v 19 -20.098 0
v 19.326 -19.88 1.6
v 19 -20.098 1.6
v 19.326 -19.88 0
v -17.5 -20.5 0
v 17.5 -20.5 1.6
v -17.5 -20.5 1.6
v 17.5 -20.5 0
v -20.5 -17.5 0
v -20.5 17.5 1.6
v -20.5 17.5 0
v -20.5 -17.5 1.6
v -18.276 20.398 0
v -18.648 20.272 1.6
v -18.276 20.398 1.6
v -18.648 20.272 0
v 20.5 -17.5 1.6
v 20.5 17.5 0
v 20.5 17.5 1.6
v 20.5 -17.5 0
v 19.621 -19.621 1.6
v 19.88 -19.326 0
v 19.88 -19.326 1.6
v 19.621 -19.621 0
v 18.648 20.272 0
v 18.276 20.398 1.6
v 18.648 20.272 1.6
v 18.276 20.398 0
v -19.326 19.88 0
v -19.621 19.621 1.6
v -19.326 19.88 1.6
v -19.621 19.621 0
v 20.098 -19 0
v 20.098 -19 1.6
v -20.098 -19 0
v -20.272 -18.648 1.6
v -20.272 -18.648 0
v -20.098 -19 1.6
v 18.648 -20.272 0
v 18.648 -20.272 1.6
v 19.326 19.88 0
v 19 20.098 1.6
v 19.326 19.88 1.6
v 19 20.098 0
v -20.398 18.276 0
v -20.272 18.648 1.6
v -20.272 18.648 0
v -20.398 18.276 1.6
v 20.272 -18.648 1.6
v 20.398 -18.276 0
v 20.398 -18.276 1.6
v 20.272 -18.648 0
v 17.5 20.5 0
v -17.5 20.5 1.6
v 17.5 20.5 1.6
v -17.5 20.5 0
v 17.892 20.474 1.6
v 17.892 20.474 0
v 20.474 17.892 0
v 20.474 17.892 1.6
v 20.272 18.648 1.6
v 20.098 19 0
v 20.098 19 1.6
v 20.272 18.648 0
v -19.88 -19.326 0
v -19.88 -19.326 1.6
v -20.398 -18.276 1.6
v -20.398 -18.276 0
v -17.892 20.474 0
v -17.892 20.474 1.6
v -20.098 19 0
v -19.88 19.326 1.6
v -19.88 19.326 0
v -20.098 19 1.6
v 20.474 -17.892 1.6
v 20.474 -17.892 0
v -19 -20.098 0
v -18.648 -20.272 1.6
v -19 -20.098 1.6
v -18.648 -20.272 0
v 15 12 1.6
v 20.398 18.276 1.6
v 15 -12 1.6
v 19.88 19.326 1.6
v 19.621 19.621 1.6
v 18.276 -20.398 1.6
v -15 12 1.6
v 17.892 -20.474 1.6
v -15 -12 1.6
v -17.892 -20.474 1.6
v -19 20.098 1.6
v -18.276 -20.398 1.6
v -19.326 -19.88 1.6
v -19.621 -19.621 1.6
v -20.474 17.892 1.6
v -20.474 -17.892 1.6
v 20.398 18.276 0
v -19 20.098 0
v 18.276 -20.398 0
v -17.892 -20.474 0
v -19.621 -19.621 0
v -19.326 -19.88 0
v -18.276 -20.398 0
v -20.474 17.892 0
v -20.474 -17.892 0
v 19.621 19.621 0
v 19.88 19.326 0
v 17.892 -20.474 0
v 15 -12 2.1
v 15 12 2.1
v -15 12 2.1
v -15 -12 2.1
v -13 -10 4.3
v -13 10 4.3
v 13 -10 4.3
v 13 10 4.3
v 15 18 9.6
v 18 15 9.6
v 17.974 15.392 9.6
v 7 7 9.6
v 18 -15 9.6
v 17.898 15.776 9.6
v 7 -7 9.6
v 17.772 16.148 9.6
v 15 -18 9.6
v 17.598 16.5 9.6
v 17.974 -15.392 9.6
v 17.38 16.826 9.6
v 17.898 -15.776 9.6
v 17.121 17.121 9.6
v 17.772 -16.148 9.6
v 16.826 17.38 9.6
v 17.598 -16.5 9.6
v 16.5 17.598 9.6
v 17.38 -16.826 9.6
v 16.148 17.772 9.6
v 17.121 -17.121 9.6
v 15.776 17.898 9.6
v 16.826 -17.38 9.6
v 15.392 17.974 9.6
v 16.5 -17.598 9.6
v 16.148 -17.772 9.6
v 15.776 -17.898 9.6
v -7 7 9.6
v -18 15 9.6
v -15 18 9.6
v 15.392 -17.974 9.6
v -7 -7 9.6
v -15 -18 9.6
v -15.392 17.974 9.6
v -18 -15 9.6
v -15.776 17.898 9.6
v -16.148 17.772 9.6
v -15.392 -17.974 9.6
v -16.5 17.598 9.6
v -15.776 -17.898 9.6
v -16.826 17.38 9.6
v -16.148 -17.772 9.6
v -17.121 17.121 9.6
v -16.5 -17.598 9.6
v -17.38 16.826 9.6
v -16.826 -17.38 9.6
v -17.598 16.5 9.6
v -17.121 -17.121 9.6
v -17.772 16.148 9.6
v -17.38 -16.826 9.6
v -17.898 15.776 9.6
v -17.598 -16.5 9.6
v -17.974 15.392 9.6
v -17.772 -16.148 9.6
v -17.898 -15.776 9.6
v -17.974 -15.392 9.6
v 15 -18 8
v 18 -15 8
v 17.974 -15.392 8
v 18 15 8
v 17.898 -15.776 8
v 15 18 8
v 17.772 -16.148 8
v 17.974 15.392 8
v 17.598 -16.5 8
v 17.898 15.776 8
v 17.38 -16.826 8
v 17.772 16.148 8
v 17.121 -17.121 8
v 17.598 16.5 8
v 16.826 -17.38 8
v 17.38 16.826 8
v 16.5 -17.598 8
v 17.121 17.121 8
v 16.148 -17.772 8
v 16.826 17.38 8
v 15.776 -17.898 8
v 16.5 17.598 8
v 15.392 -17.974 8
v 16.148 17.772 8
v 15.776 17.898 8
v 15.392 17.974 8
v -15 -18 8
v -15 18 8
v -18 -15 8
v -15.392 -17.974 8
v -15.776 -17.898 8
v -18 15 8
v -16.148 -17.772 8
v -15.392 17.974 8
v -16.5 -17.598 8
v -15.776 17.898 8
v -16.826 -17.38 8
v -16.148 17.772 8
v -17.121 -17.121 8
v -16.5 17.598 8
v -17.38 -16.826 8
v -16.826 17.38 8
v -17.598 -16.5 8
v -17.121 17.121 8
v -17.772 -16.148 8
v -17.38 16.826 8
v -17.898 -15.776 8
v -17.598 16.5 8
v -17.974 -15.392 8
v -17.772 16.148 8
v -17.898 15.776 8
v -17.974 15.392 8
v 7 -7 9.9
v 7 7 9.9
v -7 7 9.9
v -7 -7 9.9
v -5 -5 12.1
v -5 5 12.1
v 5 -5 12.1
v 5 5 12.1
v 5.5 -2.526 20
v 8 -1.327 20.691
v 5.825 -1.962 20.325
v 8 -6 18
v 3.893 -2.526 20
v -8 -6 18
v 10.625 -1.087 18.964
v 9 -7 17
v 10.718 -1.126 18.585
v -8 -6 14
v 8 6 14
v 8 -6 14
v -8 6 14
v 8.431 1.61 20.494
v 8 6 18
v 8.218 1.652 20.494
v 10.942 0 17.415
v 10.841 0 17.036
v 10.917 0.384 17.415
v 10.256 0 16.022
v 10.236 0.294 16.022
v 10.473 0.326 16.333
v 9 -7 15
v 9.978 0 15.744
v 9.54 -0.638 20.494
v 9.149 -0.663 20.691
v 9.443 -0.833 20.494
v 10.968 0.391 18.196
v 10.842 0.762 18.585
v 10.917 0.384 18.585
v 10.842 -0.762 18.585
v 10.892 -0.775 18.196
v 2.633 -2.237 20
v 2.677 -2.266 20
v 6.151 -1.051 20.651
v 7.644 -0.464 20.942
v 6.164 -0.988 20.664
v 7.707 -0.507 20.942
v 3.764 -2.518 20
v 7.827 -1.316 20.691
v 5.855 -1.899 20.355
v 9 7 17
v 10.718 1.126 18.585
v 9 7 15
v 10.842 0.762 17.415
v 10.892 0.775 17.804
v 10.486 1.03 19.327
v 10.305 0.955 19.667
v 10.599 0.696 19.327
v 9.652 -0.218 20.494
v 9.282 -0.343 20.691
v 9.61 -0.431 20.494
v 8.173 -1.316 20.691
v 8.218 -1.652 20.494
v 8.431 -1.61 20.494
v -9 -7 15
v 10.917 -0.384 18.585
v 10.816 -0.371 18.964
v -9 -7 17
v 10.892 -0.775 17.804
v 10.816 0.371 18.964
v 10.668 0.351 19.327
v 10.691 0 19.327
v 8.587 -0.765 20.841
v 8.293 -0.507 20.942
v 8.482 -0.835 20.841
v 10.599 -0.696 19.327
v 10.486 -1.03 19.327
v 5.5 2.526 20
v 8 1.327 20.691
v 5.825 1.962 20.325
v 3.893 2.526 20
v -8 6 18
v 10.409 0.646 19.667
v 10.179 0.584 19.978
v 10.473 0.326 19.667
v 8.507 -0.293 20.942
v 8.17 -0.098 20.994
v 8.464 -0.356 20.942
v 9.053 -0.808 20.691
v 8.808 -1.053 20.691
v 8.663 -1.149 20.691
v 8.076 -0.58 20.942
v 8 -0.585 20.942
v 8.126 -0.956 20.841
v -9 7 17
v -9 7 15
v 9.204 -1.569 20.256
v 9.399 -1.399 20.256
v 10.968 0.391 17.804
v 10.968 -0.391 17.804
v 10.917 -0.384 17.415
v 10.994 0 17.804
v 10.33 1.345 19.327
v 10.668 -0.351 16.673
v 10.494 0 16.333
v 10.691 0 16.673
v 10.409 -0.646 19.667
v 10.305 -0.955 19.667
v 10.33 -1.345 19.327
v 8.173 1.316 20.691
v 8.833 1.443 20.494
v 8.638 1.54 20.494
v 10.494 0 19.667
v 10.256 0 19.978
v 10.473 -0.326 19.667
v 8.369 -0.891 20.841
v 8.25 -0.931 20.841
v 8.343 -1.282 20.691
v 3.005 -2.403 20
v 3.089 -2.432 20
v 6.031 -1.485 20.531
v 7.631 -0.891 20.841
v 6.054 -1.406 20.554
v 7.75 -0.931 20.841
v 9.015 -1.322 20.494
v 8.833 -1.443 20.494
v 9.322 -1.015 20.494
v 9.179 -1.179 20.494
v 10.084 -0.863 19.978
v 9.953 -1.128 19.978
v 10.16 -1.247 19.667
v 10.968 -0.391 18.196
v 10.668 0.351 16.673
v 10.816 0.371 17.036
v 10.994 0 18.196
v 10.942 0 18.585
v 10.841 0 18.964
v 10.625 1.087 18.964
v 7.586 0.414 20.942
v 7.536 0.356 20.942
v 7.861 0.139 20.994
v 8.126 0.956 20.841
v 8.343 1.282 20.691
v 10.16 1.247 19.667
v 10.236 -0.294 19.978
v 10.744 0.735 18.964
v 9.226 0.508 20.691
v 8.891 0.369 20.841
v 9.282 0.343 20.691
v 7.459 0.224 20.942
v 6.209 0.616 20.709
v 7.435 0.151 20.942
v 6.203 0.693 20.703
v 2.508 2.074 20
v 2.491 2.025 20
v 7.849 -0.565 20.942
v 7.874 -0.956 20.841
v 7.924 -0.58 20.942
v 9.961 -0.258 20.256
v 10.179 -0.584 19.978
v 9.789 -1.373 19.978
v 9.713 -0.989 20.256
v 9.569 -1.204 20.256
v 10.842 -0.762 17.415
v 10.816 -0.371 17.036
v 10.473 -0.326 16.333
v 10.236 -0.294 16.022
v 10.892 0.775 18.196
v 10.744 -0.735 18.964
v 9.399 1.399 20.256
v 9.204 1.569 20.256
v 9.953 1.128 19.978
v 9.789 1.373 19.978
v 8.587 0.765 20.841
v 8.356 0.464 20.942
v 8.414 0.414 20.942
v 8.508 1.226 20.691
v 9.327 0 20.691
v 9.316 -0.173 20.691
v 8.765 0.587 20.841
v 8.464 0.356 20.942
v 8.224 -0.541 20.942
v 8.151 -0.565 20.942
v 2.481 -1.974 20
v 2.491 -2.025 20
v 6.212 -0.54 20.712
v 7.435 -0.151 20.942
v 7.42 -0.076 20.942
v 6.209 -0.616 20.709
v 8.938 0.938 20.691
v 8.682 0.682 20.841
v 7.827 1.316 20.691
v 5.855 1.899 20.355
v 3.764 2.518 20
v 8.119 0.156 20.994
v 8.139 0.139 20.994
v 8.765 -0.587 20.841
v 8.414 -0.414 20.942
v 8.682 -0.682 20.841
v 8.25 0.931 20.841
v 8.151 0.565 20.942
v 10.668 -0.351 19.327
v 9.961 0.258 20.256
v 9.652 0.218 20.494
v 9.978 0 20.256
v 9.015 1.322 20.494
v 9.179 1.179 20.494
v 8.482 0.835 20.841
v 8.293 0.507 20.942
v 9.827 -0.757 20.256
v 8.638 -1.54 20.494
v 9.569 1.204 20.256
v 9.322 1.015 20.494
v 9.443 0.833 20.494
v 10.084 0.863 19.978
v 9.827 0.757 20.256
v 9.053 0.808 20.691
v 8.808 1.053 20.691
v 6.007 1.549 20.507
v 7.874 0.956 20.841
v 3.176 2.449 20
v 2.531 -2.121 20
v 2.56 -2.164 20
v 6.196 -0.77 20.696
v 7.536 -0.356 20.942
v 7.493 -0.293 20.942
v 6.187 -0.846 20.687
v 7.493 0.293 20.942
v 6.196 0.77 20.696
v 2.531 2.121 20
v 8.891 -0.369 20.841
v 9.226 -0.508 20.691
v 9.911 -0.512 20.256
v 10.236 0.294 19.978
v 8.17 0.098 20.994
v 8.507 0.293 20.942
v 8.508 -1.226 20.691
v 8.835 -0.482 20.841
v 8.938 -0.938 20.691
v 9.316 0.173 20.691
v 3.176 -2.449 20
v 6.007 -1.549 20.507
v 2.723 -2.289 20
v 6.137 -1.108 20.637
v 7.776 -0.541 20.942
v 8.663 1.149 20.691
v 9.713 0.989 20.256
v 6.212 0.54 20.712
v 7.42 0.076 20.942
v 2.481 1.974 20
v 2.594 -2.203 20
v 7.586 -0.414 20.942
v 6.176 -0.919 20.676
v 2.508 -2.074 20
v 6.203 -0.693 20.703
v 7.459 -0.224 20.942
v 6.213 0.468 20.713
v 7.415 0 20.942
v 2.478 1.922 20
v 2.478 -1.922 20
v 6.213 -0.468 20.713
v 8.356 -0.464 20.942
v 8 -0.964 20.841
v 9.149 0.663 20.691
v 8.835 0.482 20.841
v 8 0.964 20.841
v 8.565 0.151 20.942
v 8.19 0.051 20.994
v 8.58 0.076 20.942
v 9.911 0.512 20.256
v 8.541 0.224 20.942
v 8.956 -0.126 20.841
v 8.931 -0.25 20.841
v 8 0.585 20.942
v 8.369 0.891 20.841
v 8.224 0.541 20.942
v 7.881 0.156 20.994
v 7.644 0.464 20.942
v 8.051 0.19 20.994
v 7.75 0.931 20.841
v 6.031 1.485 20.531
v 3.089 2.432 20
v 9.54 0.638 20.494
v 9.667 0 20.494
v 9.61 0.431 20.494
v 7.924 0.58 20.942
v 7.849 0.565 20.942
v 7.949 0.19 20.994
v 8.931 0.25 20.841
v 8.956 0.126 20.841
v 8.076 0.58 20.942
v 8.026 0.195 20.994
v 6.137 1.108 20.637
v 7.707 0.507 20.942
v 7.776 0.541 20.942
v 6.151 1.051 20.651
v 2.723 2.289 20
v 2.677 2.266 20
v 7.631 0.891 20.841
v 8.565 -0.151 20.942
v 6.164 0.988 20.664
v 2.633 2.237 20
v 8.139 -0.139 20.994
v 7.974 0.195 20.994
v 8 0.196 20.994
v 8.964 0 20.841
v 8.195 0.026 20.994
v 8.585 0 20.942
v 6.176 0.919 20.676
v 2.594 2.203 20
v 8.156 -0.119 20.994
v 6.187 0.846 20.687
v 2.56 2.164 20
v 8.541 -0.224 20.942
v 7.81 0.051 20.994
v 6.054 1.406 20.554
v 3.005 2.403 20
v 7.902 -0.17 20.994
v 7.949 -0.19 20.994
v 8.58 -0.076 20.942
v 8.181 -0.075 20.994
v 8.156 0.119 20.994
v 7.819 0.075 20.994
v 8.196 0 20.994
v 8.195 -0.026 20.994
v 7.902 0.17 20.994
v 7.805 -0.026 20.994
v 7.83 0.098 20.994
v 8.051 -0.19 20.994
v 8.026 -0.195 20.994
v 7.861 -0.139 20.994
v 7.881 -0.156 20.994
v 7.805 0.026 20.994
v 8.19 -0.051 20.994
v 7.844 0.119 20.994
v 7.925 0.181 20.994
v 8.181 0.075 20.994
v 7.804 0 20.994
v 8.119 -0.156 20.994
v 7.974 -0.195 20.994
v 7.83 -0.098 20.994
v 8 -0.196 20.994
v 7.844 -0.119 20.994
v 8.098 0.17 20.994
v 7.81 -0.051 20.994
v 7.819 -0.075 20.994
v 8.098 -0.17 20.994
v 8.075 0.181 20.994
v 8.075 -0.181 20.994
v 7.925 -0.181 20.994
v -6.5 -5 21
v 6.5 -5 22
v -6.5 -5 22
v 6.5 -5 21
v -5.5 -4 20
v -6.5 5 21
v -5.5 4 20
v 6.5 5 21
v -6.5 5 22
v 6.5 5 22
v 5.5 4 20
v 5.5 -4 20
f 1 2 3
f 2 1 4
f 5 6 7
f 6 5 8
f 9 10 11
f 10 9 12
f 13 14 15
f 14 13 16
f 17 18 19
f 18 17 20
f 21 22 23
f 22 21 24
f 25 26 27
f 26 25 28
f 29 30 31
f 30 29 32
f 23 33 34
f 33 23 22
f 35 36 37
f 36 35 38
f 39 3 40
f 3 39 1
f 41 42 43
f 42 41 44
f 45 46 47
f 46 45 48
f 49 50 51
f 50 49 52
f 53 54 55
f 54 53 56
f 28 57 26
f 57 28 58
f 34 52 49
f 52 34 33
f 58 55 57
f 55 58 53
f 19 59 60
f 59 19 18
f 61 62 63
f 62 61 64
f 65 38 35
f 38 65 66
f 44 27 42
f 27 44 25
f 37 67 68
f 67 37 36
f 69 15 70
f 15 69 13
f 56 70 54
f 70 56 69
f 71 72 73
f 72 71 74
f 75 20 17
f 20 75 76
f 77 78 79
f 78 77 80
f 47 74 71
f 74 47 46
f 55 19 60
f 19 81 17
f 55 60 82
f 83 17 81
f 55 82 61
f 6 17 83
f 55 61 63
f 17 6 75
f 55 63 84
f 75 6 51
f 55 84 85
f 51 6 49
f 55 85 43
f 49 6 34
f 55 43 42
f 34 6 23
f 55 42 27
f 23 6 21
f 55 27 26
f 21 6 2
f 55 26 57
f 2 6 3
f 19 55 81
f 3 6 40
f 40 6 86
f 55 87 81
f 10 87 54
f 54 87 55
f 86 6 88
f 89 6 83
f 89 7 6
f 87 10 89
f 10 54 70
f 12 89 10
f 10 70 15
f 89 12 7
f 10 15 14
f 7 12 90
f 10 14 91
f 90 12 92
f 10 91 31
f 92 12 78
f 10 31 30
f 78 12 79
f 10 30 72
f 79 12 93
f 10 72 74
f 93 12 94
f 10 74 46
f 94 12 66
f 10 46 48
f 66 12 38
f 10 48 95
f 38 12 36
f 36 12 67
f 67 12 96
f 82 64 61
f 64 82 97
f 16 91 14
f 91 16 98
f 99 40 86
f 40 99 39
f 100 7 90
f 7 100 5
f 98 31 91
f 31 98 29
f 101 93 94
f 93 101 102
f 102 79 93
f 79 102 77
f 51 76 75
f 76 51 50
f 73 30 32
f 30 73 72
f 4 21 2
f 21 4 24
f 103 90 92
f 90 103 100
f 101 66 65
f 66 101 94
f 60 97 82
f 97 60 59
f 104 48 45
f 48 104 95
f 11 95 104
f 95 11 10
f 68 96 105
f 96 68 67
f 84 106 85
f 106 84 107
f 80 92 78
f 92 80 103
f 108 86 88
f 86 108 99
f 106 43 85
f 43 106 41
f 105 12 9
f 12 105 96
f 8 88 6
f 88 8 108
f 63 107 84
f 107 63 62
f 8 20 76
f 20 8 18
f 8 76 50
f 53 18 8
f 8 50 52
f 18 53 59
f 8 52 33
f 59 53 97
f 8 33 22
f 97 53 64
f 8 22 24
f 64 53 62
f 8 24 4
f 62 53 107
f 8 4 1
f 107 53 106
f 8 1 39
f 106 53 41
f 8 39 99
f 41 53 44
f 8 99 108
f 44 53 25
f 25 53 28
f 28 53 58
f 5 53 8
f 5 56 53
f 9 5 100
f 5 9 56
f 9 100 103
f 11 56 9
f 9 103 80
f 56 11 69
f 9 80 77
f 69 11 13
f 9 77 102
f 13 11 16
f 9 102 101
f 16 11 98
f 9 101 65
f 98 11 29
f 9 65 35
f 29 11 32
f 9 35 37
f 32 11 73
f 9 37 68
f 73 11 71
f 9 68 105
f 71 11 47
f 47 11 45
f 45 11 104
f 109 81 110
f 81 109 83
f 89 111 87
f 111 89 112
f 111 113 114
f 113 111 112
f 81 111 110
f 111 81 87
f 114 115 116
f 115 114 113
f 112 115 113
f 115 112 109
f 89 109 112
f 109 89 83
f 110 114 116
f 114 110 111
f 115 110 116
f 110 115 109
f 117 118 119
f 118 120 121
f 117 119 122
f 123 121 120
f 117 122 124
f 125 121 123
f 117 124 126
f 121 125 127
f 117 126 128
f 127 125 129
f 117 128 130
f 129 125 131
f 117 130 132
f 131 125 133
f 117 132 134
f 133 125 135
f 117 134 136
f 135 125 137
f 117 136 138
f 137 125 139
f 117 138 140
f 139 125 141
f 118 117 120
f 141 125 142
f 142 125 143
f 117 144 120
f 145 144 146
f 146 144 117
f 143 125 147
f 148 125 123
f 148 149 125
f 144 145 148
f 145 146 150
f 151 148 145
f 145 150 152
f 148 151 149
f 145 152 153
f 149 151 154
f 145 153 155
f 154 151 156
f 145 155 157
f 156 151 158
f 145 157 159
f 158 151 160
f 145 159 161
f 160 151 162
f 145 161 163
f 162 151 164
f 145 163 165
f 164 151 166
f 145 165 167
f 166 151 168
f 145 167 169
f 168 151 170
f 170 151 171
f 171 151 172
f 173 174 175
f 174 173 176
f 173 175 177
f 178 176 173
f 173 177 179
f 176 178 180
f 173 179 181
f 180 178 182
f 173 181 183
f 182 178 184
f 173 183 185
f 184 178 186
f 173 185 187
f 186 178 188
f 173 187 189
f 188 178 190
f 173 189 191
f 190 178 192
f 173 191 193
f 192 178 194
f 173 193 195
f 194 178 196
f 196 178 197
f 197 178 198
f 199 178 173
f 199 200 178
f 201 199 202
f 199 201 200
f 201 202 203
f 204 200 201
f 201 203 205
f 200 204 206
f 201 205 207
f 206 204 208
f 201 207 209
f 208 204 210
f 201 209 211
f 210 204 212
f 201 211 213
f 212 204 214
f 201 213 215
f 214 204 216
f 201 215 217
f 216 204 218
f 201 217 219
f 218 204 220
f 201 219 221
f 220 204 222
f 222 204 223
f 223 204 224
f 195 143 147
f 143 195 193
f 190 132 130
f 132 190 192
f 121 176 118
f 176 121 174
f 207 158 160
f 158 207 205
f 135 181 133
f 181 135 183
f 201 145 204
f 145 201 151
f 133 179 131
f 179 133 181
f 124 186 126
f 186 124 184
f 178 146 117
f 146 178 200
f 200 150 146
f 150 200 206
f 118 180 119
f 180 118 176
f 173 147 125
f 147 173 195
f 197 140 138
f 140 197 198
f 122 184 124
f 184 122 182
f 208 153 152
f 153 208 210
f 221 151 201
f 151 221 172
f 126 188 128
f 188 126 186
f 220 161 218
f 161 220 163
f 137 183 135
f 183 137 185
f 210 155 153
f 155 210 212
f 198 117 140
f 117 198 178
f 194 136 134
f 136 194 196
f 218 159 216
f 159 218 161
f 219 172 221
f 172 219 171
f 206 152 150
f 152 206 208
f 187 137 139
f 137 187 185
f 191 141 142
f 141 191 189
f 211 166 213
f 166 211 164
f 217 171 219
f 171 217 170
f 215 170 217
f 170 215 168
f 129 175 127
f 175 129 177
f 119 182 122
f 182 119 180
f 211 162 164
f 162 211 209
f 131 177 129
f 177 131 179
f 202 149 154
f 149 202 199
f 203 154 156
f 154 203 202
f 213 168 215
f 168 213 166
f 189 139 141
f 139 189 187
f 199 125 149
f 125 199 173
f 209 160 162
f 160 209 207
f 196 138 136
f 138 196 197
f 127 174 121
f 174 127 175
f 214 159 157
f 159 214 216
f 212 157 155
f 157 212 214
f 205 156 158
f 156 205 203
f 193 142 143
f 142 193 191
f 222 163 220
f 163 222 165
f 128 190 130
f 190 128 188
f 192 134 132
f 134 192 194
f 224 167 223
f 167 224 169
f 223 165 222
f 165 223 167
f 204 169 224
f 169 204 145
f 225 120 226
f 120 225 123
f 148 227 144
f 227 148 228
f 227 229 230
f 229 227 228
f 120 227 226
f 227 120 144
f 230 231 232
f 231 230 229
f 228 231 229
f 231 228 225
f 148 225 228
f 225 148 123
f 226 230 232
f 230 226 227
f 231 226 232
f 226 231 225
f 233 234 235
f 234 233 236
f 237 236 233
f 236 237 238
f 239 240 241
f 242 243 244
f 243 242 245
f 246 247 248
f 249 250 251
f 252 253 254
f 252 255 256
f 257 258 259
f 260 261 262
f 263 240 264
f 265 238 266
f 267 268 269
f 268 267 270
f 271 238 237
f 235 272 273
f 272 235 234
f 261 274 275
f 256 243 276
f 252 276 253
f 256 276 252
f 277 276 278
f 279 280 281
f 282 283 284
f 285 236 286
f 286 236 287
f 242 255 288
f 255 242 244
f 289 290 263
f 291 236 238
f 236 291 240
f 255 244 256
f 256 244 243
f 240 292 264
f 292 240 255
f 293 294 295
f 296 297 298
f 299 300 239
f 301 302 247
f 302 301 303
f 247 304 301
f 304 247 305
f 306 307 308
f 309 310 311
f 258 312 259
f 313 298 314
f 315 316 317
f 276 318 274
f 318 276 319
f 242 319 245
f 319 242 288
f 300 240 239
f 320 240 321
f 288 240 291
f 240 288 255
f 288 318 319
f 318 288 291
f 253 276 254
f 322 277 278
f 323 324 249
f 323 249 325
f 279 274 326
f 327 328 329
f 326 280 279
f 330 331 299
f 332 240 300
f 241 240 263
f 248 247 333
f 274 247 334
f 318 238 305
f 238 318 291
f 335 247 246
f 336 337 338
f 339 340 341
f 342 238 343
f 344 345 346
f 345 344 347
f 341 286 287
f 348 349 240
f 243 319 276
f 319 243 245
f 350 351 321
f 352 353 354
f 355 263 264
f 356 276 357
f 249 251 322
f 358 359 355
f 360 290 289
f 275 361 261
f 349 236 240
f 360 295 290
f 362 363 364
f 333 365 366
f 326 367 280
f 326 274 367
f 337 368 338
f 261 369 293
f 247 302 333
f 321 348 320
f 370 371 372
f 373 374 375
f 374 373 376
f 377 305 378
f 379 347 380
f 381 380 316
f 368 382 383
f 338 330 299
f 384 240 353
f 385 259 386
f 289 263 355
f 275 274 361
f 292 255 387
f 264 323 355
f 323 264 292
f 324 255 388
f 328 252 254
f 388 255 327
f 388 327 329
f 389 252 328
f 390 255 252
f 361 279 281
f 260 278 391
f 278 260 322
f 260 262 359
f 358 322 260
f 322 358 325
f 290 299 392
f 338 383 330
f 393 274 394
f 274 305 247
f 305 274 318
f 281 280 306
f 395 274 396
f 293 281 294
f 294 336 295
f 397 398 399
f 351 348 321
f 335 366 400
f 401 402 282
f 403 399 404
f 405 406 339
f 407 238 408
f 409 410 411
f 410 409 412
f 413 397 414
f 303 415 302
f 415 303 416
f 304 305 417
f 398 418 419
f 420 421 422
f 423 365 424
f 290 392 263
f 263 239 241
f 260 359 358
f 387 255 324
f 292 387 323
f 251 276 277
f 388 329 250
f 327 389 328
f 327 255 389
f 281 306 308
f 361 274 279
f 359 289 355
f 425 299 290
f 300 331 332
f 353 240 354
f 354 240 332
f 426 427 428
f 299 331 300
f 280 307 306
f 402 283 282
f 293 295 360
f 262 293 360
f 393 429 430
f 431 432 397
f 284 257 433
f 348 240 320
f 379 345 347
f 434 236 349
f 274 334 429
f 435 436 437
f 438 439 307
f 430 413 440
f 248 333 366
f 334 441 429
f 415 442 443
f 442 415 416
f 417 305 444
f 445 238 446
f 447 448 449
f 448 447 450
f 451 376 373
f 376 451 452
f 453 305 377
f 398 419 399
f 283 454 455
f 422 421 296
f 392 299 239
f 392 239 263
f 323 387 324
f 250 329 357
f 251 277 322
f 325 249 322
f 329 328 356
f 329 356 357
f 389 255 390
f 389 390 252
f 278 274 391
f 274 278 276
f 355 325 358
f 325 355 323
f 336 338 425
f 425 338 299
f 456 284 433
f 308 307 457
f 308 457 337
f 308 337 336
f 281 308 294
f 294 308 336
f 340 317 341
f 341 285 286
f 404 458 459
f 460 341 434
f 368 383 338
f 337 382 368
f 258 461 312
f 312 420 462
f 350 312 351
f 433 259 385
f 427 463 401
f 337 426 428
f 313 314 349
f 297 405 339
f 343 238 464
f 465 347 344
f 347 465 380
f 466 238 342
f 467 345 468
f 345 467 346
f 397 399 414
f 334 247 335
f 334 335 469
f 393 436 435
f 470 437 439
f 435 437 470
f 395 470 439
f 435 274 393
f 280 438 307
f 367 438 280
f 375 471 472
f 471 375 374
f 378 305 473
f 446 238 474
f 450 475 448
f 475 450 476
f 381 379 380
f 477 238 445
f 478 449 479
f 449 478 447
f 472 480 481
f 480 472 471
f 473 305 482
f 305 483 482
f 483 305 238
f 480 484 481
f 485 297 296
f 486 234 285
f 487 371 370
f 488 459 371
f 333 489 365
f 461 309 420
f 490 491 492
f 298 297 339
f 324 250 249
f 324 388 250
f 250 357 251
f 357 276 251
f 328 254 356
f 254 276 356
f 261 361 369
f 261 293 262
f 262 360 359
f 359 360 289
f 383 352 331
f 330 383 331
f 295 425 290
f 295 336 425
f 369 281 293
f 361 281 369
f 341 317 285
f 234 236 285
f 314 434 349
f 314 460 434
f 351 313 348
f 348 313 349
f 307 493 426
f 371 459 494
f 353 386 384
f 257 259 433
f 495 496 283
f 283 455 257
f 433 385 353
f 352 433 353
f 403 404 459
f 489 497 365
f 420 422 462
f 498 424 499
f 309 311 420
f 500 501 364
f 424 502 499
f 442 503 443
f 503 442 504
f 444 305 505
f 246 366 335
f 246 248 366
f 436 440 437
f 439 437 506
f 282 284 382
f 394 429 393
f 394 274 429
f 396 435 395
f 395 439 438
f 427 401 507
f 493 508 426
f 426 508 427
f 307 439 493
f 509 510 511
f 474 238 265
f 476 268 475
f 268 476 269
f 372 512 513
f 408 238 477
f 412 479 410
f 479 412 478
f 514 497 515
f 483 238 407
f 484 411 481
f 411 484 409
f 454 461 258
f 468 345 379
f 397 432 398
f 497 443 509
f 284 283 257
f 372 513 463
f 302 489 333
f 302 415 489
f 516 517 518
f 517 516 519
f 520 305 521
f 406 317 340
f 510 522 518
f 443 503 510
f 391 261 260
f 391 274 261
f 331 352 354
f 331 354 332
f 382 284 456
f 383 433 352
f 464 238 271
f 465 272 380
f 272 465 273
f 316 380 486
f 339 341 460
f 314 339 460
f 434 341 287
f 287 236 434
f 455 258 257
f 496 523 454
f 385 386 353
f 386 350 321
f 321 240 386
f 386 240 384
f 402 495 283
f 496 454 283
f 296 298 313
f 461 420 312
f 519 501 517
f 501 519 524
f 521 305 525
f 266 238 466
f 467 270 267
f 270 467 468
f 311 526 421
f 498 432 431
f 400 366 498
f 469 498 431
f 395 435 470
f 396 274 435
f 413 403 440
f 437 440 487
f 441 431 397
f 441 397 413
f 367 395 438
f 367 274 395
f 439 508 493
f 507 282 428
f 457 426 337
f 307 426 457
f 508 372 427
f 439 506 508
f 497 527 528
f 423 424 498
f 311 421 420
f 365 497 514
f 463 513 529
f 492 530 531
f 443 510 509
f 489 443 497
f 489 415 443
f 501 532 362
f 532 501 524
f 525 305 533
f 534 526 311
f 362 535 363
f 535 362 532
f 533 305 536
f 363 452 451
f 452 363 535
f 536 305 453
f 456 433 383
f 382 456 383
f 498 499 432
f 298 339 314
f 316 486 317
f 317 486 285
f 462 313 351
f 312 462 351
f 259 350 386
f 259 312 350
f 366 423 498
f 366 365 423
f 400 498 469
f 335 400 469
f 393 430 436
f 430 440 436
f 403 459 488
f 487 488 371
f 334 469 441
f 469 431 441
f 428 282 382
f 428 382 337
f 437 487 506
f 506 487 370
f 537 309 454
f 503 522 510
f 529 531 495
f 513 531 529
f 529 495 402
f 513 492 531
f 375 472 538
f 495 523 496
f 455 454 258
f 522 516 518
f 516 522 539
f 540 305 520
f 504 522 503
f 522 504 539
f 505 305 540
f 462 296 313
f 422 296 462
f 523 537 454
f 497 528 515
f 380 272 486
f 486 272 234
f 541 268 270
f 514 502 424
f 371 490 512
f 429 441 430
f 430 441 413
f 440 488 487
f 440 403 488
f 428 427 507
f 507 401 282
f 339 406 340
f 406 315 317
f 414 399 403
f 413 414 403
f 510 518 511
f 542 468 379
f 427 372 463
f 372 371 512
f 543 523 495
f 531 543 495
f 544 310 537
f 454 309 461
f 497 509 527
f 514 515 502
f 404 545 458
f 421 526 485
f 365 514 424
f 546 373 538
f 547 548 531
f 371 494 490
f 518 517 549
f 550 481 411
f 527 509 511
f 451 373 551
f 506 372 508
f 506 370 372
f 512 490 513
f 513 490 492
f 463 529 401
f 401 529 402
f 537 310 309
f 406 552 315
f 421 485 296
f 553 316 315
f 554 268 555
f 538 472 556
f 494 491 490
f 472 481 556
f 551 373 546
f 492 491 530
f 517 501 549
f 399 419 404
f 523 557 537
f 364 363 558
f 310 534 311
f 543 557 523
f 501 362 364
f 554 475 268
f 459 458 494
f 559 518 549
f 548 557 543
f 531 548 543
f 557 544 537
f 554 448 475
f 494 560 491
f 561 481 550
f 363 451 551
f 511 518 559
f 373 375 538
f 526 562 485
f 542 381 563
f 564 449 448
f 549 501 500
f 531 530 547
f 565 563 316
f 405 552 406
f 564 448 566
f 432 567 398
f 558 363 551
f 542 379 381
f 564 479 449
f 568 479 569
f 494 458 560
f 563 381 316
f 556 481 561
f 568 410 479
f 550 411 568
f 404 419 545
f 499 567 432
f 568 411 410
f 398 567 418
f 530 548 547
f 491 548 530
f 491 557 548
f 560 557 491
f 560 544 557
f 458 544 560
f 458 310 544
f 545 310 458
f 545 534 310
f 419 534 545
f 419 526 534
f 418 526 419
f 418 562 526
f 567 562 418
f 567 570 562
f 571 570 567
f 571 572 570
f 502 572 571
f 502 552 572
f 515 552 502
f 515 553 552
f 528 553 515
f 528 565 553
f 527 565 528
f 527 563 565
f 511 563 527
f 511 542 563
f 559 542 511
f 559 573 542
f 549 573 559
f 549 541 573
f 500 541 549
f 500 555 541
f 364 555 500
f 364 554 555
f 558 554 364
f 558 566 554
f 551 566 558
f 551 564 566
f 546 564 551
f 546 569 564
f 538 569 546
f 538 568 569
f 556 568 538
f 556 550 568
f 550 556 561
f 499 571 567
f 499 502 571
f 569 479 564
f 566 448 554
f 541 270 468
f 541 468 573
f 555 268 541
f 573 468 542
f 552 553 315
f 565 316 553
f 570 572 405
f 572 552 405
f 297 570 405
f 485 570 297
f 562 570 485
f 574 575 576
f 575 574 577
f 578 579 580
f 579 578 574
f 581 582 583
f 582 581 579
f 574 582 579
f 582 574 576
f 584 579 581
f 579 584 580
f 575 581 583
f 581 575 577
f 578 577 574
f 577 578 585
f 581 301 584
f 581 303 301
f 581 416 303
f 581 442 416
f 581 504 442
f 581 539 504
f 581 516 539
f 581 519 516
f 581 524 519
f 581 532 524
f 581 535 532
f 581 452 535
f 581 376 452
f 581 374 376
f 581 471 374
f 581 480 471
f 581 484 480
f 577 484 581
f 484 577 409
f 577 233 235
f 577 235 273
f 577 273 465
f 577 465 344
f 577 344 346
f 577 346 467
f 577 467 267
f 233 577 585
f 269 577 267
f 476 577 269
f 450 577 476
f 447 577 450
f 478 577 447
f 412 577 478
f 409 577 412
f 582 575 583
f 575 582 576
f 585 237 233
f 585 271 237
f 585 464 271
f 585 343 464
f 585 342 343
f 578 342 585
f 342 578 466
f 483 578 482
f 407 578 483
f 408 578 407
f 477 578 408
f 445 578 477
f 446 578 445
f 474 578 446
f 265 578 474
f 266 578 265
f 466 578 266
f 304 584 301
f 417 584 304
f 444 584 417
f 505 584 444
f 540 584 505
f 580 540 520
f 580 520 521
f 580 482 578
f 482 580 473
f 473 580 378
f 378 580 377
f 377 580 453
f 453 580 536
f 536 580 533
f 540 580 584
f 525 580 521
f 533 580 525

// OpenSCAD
// file: ../parts/receiver.scad
$fa = 2;
$fs = 0.4;

module receiver() {
  color("#1e4a1e")
    hull() {
      cube([11, 8, 2], center = true);
      translate([0, 0, 0.5])
        cube([13, 10, 1], center = true);
    }
}

receiver();
// file: ../parts/vtx_module.scad
$fa = 2;
$fs = 0.4;

module vtx_module() {
  color("#1a1a22")
    hull() {
      cube([16, 12, 4], center = true);
      translate([0, 0, 0])
        cube([18, 14, 2], center = true);
      translate([8, 0, 2])
        sphere(d = 6);
    }
}

vtx_module();
// file: ../parts/esc_stack.scad
$fa = 2;
$fs = 0.4;

module esc_stack() {
  color("#0b3d0b")
    union() {
      hull() {
        for (x = [-17.5, 17.5], y = [-17.5, 17.5])
          translate([x, y, 0])
            cylinder(h = 1.6, d = 6);
      }
      // The MOSFET block sits on the board (it floated 1.7 mm above it).
      color("#303038")
        translate([0, 0, 1.8])
          hull() {
            cube([30, 24, 0.6], center = true);
            translate([0, 0, 2.2])
              cube([26, 20, 0.6], center = true);
          }
    }
}

esc_stack();
// file: ../parts/flight_controller.scad
$fa = 2;
$fs = 0.4;

module flight_controller() {
  color("#0b3d0b")
    union() {
      hull() {
        for (x = [-15, 15], y = [-15, 15])
          translate([x, y, 0])
            cylinder(h = 1.6, d = 6);
      }
      // The MCU sits on the board (it floated 1.2 mm above it).
      color("#1a1a1a")
        translate([0, 0, 1.7])
          hull() {
            cube([14, 14, 0.4], center = true);
            translate([0, 0, 2.2])
              cube([10, 10, 0.4], center = true);
          }
      for (x = [-15.25, 15.25], y = [-15.25, 15.25])
        translate([x, y, 0])
          cylinder(h = 1.6, d = 5);
    }
}

flight_controller();
// main file
use <../parts/flight_controller.scad>
use <../parts/esc_stack.scad>
use <../parts/vtx_module.scad>
use <../parts/receiver.scad>

$fa = 2;
$fs = 0.4;

module avionics_assy() {
  esc_stack();
  translate([0, 0, 8])
    flight_controller();
  translate([0, 0, 16])
    vtx_module();
  translate([0, 0, 21])
    receiver();
}

avionics_assy();
